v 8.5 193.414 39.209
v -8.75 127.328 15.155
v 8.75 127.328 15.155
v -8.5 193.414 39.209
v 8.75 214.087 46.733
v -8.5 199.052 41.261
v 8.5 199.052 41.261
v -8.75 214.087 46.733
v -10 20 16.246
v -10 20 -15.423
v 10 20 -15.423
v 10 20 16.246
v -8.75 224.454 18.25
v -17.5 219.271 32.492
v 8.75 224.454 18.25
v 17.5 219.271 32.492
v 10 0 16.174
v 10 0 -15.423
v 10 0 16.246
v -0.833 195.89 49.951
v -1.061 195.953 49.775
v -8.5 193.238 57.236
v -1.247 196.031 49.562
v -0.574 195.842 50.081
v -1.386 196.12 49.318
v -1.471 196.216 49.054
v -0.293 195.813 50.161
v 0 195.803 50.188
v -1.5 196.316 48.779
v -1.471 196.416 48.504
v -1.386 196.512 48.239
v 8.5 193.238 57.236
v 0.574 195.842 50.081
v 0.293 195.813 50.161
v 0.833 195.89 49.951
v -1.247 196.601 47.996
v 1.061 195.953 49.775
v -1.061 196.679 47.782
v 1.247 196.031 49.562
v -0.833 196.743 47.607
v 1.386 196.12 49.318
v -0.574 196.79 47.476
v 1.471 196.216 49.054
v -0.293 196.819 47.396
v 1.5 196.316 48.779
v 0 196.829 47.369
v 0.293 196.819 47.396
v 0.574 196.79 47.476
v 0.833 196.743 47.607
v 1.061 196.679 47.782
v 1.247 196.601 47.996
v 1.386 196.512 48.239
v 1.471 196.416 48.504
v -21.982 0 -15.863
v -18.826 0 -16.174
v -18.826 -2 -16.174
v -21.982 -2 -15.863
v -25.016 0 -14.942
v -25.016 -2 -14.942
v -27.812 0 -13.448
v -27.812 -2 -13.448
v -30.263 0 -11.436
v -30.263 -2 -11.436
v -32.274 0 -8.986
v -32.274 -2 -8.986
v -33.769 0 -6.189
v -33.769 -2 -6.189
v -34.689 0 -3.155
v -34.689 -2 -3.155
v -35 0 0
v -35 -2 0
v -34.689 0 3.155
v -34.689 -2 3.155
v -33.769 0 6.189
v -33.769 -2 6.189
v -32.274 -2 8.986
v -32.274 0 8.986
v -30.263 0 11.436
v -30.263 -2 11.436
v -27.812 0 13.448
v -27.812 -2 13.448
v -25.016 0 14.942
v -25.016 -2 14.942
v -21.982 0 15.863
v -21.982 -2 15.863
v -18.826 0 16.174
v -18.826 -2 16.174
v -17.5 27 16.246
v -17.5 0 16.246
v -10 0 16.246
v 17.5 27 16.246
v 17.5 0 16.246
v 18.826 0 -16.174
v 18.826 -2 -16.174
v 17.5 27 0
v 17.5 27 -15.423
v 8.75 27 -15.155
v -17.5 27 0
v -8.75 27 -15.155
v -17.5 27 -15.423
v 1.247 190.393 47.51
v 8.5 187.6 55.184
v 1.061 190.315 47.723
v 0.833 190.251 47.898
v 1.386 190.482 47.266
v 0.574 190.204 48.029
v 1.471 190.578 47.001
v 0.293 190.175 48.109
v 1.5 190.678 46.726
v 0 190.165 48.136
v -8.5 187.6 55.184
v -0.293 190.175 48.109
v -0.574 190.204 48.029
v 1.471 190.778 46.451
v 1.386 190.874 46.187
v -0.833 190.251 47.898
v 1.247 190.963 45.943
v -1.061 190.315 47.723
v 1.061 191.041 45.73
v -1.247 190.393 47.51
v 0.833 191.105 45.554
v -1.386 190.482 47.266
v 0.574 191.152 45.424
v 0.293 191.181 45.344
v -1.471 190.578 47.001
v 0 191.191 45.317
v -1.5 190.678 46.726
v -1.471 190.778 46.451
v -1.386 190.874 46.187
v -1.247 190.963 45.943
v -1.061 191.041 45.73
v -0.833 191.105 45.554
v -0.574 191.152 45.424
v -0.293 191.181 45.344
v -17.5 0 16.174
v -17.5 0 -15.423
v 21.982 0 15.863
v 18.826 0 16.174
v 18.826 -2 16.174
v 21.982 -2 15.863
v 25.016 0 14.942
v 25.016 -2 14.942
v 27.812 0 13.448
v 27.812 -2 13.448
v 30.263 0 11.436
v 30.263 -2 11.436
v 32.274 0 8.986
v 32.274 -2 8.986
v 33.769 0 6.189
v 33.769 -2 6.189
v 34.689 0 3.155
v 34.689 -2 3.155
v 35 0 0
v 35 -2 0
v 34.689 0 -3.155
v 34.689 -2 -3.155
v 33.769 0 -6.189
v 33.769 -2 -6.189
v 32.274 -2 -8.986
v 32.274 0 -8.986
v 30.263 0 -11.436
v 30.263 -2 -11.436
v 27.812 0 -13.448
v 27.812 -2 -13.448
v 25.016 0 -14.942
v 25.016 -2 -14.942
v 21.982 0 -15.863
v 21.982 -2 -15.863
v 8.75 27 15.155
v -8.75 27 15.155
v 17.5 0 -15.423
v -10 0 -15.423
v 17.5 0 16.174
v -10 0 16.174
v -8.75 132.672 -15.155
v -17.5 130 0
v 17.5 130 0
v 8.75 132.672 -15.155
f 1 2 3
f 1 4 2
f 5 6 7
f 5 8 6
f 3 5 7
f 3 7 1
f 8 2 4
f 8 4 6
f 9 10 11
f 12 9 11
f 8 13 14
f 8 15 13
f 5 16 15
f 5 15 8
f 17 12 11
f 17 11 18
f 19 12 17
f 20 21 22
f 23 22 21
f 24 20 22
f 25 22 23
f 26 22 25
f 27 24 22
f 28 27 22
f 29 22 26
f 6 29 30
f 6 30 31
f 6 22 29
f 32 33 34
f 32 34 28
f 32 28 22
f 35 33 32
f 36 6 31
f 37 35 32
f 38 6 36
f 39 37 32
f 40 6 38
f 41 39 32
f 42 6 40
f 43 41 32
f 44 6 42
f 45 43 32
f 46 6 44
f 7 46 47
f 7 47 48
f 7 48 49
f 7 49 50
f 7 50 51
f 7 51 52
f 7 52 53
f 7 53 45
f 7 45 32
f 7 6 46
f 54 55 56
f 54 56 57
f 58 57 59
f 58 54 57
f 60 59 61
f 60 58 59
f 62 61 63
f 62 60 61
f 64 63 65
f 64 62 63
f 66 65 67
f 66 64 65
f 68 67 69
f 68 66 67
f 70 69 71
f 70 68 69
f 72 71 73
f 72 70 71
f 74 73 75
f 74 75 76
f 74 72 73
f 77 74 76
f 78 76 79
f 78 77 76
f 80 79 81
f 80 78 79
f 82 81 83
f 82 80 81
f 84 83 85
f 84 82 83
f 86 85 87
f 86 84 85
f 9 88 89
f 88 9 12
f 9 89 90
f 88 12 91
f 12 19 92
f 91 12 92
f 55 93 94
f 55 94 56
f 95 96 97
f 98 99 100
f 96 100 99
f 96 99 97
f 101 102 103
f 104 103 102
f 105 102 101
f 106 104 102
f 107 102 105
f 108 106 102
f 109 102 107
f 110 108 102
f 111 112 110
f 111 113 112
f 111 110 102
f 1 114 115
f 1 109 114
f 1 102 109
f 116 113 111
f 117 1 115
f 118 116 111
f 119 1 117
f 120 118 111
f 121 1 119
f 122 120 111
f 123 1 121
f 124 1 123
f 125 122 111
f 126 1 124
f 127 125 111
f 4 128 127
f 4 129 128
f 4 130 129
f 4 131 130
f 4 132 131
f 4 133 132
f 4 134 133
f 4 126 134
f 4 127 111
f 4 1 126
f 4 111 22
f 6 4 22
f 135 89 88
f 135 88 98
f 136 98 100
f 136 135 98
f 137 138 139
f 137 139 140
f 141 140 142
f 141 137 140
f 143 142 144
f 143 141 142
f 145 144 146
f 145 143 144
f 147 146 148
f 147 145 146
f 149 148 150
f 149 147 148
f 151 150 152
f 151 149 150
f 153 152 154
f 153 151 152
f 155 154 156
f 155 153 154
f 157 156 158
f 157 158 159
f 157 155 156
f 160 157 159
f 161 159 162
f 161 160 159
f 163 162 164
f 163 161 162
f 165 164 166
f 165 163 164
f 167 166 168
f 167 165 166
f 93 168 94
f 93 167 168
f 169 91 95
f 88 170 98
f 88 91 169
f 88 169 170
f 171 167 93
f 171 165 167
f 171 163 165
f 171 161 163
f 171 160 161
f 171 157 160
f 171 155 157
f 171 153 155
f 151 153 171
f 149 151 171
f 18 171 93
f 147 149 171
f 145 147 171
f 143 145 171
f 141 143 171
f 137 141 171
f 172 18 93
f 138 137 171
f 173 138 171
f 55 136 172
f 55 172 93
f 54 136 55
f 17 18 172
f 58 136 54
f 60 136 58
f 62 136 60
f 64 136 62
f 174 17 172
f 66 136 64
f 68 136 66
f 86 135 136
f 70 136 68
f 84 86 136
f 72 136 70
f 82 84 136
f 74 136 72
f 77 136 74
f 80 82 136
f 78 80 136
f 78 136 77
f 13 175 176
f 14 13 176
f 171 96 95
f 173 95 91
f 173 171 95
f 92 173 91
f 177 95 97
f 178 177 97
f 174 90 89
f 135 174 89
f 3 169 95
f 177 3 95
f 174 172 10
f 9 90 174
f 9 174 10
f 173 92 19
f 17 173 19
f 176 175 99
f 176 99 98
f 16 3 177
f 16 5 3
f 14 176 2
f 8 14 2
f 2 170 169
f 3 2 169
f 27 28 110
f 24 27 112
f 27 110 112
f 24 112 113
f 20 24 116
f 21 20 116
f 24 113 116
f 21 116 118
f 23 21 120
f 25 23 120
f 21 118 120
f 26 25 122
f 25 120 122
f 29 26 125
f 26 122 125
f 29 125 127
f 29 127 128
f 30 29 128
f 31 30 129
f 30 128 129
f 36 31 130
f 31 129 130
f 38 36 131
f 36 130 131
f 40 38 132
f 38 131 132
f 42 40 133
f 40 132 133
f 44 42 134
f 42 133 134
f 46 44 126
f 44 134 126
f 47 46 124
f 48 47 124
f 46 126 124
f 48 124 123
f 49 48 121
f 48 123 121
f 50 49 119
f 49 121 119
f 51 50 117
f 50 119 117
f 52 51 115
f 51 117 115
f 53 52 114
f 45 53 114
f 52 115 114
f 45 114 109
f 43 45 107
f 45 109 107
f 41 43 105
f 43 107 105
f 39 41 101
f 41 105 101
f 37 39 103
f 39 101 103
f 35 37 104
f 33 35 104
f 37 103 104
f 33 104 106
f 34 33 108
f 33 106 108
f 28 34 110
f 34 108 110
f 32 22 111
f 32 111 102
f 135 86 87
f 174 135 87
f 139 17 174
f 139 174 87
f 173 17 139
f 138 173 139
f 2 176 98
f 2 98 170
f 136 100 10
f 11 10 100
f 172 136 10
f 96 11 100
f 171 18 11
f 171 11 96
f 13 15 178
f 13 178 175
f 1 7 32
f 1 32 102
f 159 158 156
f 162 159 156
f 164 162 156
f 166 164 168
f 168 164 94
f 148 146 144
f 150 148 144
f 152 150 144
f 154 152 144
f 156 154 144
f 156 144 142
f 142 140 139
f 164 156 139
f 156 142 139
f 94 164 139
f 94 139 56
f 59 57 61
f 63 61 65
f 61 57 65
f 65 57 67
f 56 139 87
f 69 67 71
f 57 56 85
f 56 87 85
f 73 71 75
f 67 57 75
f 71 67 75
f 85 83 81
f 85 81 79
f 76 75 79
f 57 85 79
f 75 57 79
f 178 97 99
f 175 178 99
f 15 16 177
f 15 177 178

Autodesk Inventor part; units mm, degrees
sketch "Sketch1" plane through (0, 0, 0) normal (0, 1, 0) x (-1, 0, 0)
  line L0 (0, 0) -> (17.5, 0)
  line L1 (17.5, 0) -> (8.75, -15.1554)
  line L2 (8.75, -15.1554) -> (-8.75, -15.1554)
  line L3 (-8.75, -15.1554) -> (-17.5, 0)
  line L4 (-17.5, 0) -> (-8.75, 15.1554)
  line L5 (-8.75, 15.1554) -> (8.75, 15.1554)
  line L6 (8.75, 15.1554) -> (17.5, 0)
  dimension "d1" = 17.5
sketch "Sketch3" plane through (0, 0, 0) normal (1, 0, 0) x (0, 1, 0)
  line L0 (0, 0) -> (130, 0)
  line L1 (130, 0) -> (219.2708, 32.4919)
  dimension "d5" = 130
  dimension "d6" = 95
  dimension "d7" = 160
sweep "Sweep1" add profiles "Sketch1" path "Sketch3"
sketch "Sketch4" plane through (-8.75, 127.3277, 15.1554) normal (0, -0.3420201, 0.9396926) x (1, 0, 0)
  line L0 (0, 92.3277) -> (17.5, 92.3277) projected
  line L1 (8.75, 92.3277) -> (8.75, 76.3277)
  line L2 (8.75, 76.3277) -> (17.25, 76.3277)
  line L3 (17.5, 0) -> (17.5, 92.3277) projected
  line L4 (17.25, 76.3277) -> (17.25, 70.3277)
  line L5 (17.25, 70.3277) -> (0.25, 70.3277)
  line L6 (0, 0) -> (0, 92.3277) projected
  line L7 (0.25, 70.3277) -> (0.25, 76.3277)
  line L8 (0.25, 76.3277) -> (8.75, 76.3277)
  point P0 (8.75, -124.8324)
  dimension "d10" = 16
  dimension "d11" = 8.5
  dimension "d12" = 6
  dimension "d13" = 17
extrude "Extrusion1" add sketch "Sketch4" along normal blind 17
sketch "Sketch5" plane through (-8.5, 199.0522, 41.2611) normal (0, 0.9396926, 0.3420201) x (1, 0, 0)
  line L0 (17, 0) -> (0, 0) projected
  line L1 (8.5, 0) -> (8.5, -8)
  circle A0 centre (8.5, -8) radius 2.5
  point P0 (8.5, -29.3072)
  dimension "d16" = 8
  dimension "d17" = 5
hole "Hole1" at (0, 196.3161, 48.7786) direction (0, -0.9396926, -0.3420201) diameter 3 depth 10.077 tip angle 118
sketch "Sketch6" plane through (0, 0, 0) normal (0, 1, 0) x (-1, 0, 0)
  line L0 (17.5, 0) -> (8.75, 15.1554) projected
  line L1 (17.5, 0) -> (17.5, -15.4226)
  line L2 (17.5, -15.4226) -> (-17.5, -15.4226)
  line L3 (-17.5, -15.4226) -> (-17.5, 16.246)
  line L4 (-17.5, 0) -> (-17.5, 32.4919) projected
  line L5 (17.5, 0) -> (17.5, 32.4919) projected
  line L6 (17.5, 16.246) -> (-17.5, 16.246)
  line L7 (17.5, 16.246) -> (17.5, 0)
  point P0 (0, 0)
extrude "Extrusion2" add sketch "Sketch6" along normal blind 27
sketch "Sketch7" plane through (-17.5, 0, 16.246) normal (0, 0, 1) x (1, 0, 0)
  line L0 (17.5, 0) -> (7.5, 0)
  line L1 (35, 0) -> (0, 0) projected
  line L2 (7.5, 0) -> (27.5, 0)
  line L3 (7.5, 0) -> (7.5, 20)
  line L4 (7.5, 20) -> (27.5, 20)
  line L5 (27.5, 20) -> (27.5, 0)
  dimension "d27" = 10
  dimension "d28" = 20
  dimension "d29" = 20
extrude "Extrusion3" cut sketch "Sketch7" against normal blind 50
sketch "Sketch8" plane through (0, 0, 0) normal (0, 1, 0) x (-1, 0, 0)
  line L0 (0, 0) -> (-35, 0)
  line L1 (-35, 0) -> (35, 0) construction
  line L2 (-18.8264, -16.1736) -> (18.8264, -16.1736)
  line L3 (18.8264, 16.1736) -> (-18.8264, 16.1736)
  arc A0 (-18.8264, 16.1736) -> (-18.8264, -16.1736) centre (-18.8264, 0) ccw
  arc A1 (18.8264, -16.1736) -> (18.8264, 16.1736) centre (18.8264, 0) ccw
  dimension "d32" = 35
  dimension "d33" = 70
extrude "Extrusion4" add sketch "Sketch8" against normal blind 2
properties part number "Kamerahalter_II"
